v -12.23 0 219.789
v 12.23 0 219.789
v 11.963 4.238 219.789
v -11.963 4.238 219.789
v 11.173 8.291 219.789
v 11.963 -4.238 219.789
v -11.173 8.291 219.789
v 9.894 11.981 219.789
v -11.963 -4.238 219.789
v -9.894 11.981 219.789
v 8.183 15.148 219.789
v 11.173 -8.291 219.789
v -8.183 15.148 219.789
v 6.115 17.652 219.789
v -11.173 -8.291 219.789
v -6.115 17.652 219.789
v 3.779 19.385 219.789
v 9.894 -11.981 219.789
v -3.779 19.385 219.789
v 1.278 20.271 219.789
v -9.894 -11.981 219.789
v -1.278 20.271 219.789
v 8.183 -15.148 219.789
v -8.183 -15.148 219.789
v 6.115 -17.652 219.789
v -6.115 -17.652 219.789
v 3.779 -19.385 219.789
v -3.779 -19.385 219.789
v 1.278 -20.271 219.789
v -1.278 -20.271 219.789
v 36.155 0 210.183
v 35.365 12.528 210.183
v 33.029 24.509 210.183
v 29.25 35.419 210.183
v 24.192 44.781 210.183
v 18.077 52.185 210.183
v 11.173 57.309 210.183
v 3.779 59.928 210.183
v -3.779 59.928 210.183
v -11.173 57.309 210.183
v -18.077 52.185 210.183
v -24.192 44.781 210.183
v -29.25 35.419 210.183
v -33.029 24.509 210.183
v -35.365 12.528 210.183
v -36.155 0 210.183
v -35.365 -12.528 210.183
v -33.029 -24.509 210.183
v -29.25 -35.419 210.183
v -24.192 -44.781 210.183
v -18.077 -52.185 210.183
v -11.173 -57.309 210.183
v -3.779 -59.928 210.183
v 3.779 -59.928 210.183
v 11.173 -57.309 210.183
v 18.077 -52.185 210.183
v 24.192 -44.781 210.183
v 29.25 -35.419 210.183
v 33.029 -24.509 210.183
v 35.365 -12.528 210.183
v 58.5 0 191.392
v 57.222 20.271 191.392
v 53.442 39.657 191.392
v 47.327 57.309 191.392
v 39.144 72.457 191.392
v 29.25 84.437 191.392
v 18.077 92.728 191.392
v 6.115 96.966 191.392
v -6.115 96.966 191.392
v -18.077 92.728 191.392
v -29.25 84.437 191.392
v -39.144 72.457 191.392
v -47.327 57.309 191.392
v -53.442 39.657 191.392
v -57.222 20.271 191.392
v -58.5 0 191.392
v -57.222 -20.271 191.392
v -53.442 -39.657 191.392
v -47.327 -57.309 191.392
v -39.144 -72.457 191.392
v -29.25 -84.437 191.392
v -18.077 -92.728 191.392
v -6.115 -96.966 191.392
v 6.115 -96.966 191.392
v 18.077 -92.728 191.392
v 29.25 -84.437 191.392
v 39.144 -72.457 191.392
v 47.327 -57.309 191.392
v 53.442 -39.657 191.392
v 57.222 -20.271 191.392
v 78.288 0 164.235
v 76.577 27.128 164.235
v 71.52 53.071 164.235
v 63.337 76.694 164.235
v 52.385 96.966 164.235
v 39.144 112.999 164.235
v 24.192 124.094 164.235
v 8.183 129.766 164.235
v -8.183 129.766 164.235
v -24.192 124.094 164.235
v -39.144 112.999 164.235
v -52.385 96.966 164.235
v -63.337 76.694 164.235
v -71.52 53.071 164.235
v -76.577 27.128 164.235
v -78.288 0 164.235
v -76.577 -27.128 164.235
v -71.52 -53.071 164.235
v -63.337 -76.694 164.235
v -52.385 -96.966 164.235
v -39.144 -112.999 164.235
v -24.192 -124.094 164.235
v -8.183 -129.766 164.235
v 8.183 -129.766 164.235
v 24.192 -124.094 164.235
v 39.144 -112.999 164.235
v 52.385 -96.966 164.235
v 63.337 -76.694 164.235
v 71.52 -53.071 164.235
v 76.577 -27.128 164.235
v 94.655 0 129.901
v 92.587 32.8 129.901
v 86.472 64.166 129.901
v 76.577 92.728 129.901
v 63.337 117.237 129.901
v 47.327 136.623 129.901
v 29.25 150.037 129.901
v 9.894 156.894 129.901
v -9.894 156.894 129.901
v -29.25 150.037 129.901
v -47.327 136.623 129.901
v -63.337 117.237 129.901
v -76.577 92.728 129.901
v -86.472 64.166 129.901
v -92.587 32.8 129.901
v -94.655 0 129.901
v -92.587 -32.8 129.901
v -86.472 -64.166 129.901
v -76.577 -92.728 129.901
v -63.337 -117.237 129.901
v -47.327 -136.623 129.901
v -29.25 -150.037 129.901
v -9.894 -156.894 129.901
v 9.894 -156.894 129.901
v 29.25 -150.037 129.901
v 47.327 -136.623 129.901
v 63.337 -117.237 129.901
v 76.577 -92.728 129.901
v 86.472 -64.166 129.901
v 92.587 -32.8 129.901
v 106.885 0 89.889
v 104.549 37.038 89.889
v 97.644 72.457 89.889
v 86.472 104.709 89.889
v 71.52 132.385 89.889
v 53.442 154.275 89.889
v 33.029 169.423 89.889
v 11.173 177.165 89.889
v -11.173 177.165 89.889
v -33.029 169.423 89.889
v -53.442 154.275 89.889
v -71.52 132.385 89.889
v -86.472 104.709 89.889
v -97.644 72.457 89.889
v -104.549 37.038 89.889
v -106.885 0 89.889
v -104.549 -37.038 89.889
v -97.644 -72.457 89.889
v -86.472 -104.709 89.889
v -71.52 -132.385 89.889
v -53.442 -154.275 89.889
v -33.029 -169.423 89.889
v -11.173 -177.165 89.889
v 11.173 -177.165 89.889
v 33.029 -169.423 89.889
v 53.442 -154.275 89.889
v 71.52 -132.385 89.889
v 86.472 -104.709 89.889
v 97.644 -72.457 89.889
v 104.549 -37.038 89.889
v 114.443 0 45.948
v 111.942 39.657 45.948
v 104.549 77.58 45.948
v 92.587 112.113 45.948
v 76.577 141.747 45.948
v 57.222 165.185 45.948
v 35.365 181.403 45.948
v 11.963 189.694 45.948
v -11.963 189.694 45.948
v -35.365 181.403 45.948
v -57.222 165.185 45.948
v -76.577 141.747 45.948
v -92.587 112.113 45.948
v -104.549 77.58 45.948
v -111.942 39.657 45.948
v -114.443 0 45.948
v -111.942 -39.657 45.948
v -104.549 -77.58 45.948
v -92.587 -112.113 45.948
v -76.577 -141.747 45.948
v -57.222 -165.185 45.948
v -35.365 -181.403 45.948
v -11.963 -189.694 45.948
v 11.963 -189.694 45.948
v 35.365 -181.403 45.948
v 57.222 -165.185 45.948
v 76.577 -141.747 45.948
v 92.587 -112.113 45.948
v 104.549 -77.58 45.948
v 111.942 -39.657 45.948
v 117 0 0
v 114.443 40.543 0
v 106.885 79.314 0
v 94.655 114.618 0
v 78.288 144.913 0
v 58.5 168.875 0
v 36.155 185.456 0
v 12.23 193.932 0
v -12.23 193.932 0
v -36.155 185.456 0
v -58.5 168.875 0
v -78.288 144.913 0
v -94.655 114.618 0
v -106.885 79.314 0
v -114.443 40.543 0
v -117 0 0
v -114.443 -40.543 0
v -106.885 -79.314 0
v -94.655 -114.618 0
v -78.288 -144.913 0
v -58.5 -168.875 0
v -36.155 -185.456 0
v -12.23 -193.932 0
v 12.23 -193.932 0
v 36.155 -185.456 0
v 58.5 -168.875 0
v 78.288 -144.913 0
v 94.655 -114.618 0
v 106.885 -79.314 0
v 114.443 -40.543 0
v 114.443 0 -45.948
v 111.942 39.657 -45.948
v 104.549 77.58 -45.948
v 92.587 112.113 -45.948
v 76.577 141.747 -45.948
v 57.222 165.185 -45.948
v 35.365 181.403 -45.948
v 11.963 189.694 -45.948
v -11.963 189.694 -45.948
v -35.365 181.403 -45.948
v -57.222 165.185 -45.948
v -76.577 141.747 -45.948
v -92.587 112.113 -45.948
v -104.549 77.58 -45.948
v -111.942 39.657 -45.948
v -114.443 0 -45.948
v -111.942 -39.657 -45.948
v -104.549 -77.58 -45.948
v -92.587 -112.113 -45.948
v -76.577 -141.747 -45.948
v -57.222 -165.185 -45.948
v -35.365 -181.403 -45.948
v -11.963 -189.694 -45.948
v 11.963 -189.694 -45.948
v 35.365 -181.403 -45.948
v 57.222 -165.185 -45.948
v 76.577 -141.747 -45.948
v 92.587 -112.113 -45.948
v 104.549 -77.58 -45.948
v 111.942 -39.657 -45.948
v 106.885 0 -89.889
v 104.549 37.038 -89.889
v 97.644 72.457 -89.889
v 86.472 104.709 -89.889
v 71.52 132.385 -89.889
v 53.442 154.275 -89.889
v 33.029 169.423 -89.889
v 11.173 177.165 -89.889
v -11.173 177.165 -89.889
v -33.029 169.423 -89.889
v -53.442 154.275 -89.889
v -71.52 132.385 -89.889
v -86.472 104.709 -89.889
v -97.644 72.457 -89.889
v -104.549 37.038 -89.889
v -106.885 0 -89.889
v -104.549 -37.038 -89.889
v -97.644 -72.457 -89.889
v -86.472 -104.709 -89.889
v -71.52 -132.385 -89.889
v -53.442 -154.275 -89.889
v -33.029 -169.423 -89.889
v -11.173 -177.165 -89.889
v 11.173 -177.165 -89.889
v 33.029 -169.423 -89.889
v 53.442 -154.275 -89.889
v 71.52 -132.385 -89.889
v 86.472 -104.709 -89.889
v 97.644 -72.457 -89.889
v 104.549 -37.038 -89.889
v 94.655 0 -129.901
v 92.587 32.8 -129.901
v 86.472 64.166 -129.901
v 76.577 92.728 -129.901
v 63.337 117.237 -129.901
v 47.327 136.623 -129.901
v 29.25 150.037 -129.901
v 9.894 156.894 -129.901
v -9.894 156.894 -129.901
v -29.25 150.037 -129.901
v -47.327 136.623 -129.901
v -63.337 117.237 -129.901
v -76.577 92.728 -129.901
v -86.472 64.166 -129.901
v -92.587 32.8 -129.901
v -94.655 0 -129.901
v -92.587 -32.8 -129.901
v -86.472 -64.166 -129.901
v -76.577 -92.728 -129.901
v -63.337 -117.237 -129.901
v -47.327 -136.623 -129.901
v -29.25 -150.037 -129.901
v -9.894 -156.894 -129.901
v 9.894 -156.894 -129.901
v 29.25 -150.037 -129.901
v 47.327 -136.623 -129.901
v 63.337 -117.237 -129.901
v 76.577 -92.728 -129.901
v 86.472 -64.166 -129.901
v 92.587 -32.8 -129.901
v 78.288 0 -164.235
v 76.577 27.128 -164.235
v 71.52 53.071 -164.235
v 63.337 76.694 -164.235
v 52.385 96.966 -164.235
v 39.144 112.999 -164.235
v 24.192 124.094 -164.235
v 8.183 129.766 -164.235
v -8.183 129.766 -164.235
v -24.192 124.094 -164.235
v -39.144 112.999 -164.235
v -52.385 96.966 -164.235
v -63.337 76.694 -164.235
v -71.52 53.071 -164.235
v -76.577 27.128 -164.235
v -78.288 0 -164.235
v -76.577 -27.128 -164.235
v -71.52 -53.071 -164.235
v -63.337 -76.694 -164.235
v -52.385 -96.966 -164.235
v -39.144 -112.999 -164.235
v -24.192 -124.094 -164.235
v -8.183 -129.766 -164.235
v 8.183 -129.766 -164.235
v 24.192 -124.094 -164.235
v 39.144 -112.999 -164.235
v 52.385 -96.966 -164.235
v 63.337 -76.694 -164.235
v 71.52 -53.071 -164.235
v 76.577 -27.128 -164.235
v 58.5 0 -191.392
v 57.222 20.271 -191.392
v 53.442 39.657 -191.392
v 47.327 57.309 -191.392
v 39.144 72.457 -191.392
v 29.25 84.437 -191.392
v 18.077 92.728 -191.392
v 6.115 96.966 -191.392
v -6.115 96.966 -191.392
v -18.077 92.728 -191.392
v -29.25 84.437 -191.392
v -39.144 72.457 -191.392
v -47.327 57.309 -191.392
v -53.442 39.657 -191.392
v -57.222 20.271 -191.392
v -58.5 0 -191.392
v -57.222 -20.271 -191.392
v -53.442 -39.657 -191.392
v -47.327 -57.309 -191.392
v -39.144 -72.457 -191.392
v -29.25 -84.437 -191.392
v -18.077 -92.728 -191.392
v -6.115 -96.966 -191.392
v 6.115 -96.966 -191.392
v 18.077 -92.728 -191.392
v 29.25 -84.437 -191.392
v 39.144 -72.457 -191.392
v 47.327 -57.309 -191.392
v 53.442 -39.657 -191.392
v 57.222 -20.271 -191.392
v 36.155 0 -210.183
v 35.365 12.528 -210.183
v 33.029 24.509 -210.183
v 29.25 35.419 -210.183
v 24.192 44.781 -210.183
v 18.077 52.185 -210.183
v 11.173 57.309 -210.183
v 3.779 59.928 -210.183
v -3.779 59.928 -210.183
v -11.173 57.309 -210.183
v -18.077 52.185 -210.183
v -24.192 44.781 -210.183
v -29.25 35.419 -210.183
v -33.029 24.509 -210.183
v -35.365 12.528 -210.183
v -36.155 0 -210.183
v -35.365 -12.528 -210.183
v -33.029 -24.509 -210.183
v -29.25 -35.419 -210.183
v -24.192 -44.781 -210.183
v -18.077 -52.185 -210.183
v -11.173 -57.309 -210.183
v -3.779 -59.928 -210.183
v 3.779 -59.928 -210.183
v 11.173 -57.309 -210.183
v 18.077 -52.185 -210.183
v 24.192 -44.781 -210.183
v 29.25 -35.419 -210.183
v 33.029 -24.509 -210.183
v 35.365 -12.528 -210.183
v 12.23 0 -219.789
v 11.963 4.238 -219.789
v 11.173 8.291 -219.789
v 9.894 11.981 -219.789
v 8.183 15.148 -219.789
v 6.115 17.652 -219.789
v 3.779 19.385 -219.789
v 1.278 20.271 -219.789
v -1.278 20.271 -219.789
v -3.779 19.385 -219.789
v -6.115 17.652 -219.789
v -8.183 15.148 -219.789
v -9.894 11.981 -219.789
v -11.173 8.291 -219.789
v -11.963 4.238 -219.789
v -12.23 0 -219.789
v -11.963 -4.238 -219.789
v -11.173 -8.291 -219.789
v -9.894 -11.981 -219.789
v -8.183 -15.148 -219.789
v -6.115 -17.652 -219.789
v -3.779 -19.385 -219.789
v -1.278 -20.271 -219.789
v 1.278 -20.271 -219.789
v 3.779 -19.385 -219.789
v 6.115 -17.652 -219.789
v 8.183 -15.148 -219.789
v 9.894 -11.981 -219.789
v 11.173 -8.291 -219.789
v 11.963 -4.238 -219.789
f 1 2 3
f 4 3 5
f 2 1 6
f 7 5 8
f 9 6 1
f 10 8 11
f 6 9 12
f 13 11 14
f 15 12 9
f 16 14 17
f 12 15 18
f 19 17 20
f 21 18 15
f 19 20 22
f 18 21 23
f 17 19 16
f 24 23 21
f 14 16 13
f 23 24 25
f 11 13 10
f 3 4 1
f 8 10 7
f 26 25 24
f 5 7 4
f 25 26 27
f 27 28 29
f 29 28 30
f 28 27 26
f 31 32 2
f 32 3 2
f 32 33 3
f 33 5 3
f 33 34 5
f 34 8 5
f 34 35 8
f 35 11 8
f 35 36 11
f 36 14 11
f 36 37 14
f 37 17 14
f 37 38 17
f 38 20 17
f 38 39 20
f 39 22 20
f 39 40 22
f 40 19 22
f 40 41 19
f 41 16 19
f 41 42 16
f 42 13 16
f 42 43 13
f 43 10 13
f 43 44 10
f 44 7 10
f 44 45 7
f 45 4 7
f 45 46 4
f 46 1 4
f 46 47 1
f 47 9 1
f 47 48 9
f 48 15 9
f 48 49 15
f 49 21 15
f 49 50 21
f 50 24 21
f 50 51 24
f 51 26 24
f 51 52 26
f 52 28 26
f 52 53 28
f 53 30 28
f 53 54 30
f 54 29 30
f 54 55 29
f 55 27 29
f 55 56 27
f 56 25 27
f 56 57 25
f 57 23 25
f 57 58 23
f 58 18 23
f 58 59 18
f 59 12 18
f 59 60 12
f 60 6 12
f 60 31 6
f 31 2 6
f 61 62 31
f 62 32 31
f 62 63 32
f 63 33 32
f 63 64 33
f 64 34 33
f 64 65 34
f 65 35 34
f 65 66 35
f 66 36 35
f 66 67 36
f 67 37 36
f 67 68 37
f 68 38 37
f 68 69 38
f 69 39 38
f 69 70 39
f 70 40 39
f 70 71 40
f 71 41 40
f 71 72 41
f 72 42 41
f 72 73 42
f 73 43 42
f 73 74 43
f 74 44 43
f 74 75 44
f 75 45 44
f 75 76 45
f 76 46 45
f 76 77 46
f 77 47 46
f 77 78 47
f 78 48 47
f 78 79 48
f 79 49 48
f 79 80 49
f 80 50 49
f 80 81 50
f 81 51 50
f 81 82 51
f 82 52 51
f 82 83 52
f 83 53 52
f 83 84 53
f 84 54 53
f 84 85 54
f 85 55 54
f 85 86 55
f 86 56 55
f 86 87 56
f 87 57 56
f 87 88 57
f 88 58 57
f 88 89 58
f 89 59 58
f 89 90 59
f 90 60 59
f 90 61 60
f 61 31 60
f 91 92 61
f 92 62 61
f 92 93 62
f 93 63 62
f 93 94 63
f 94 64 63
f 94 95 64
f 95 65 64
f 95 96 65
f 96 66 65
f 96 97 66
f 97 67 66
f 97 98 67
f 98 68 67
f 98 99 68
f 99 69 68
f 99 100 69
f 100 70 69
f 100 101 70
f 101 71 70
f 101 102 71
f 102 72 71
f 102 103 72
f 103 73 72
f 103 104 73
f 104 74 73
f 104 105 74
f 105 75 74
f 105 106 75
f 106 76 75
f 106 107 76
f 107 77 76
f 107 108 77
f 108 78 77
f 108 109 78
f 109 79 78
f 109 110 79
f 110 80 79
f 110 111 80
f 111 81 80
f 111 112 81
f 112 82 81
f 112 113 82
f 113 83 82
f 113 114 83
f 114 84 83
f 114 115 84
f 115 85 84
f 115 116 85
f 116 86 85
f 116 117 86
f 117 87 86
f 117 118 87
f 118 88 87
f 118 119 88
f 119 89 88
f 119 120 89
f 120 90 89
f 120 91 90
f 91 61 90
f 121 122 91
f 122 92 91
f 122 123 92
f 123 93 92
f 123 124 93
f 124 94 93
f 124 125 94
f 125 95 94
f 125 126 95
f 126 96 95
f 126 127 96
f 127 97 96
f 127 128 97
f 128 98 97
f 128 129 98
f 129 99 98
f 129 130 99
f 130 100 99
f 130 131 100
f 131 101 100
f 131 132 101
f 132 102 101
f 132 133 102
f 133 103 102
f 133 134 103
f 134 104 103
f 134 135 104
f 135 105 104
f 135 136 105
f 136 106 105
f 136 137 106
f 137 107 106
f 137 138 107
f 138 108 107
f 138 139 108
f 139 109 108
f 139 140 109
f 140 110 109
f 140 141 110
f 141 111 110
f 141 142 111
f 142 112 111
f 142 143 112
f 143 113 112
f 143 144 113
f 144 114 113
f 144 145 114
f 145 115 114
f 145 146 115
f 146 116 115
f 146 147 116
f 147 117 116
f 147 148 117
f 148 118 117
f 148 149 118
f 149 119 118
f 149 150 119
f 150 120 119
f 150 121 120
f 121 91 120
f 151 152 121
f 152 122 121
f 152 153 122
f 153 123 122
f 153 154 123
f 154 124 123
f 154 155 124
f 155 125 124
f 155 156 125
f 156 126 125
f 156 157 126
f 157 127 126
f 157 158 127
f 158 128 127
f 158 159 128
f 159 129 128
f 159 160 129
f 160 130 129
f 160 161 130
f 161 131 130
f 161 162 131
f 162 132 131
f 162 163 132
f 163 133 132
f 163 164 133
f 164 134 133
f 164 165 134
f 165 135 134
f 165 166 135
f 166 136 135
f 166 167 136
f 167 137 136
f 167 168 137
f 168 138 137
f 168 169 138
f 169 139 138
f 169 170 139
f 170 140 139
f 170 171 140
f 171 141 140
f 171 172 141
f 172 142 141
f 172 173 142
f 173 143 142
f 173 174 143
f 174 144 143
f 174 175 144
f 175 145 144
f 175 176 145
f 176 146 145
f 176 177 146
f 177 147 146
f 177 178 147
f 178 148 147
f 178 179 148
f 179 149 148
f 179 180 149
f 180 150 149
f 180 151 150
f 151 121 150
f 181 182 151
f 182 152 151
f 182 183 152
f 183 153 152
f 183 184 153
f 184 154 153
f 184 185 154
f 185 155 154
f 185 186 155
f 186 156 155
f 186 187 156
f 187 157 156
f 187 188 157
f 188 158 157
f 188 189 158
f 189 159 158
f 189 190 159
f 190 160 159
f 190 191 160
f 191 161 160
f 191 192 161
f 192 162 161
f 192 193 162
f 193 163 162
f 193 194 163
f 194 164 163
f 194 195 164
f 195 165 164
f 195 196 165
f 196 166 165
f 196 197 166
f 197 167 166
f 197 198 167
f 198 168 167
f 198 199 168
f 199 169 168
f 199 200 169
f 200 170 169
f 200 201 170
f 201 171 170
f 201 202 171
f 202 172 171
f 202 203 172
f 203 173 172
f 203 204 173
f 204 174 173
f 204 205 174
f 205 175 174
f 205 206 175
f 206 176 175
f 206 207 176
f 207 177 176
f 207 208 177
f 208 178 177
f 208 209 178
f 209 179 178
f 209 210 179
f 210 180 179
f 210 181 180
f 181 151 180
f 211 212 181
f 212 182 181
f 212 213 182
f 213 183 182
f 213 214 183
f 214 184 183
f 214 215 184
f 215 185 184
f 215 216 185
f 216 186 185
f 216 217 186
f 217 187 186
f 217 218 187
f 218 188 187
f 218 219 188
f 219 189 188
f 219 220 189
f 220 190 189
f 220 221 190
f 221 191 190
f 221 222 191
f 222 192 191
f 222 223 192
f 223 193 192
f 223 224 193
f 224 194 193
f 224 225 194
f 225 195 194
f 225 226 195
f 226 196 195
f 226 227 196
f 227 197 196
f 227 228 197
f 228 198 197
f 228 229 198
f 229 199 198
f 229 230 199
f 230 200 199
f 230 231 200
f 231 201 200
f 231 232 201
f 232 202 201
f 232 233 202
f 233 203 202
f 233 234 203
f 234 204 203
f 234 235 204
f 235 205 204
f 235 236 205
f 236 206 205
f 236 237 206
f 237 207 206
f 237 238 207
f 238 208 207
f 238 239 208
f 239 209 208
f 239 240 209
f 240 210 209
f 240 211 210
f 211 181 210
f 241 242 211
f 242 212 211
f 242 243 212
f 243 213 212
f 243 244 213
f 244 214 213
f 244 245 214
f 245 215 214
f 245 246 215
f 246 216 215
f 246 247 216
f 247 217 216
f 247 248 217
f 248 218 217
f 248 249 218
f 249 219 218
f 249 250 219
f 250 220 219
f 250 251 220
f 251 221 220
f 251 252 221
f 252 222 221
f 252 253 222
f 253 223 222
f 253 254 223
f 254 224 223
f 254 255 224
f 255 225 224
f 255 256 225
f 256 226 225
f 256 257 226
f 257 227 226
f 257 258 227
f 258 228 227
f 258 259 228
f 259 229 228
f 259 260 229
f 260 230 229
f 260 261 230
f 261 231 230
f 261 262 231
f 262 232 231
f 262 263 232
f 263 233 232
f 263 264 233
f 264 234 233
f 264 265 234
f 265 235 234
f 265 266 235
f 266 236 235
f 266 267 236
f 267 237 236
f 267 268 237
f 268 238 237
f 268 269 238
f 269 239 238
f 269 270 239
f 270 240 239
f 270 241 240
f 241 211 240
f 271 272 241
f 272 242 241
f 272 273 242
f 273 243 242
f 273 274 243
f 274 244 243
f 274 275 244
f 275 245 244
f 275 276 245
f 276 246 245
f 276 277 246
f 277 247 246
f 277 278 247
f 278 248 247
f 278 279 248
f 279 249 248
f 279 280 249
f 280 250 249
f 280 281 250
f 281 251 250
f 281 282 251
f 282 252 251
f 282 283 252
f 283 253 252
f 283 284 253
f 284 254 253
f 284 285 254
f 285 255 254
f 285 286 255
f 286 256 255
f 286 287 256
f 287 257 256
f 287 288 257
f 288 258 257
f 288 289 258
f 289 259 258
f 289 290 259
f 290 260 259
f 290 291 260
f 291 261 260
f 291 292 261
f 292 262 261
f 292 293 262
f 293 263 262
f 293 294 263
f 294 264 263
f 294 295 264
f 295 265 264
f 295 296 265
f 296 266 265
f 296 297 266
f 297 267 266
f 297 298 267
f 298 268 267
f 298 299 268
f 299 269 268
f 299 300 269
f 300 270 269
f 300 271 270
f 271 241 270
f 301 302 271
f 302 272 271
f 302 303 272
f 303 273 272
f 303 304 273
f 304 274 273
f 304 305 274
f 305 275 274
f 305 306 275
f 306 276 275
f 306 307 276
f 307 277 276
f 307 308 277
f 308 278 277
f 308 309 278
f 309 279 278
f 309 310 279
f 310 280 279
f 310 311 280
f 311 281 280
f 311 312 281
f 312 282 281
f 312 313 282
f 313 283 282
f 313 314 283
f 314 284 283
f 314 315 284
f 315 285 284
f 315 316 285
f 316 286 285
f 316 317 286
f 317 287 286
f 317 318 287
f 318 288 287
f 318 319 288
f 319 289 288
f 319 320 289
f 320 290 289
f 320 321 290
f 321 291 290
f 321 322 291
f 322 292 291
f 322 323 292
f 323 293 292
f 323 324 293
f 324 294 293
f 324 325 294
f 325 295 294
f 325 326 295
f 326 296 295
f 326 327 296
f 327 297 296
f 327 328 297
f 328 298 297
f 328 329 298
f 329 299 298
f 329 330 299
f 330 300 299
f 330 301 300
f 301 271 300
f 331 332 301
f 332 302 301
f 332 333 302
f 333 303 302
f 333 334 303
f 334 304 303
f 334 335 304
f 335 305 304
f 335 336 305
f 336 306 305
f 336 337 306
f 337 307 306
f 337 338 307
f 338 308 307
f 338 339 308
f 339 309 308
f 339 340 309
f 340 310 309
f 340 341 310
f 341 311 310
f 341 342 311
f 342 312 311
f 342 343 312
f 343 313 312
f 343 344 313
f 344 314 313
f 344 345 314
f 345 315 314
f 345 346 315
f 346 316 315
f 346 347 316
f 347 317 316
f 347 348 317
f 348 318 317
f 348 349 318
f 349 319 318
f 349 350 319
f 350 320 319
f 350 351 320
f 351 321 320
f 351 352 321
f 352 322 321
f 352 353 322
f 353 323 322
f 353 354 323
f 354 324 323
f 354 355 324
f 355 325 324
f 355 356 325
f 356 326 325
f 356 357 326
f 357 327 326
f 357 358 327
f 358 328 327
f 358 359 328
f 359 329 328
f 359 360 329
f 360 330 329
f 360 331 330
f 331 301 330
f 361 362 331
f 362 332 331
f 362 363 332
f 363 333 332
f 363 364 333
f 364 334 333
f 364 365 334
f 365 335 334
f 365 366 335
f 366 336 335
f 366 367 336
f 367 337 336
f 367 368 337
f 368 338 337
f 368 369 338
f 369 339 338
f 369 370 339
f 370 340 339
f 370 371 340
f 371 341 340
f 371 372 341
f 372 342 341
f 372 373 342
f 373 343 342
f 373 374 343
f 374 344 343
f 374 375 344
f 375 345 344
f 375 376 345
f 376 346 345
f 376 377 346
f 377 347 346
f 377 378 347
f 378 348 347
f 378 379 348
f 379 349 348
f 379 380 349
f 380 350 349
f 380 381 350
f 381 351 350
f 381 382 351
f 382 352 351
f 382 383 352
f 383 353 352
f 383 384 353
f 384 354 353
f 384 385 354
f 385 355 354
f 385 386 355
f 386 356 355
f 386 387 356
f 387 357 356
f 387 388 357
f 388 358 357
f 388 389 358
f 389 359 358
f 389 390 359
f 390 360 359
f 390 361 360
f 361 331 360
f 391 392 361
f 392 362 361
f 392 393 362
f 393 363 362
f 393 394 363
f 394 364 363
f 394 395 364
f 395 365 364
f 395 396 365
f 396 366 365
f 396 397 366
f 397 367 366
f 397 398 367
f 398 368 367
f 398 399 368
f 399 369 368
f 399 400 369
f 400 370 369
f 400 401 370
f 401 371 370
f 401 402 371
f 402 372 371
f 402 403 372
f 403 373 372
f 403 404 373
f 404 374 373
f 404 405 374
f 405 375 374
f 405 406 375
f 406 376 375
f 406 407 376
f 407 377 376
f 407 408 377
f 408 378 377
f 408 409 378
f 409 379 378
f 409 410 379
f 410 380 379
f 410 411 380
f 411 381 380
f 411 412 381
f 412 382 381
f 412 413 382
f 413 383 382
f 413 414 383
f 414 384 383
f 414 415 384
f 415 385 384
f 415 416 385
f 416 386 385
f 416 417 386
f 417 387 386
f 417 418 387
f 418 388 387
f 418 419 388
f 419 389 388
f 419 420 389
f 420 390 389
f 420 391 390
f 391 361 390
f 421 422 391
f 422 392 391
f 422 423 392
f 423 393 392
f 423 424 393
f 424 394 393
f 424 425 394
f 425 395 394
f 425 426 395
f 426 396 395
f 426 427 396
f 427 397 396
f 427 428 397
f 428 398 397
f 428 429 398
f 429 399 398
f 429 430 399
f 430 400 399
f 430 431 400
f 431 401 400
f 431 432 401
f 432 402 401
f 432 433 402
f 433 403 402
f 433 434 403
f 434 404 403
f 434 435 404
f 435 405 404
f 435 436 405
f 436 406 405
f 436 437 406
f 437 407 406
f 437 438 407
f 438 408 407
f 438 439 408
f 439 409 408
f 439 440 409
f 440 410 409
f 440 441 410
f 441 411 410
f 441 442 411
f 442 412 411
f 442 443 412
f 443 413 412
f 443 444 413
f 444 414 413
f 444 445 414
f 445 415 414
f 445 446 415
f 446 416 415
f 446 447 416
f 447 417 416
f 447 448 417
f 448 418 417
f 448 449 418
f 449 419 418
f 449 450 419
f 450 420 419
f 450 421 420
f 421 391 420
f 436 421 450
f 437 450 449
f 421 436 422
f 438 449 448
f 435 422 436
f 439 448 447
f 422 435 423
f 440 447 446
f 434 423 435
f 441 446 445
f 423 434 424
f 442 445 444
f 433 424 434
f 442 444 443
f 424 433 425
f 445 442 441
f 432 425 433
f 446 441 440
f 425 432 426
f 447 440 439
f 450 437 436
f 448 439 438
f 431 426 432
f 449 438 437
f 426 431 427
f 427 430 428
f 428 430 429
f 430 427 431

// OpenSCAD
// Generated by SolidPython 1.0.1 on 2020-07-29 00:46:49


scale(v = [9, 15, 17]) {
	sphere(r = 13);
}
/***********************************************
*********      SolidPython code:      **********
************************************************
 
# import packages: SolidPython
from solid import *
from solid.utils import *
from itertools import chain, combinations, permutations


class Resize:

    def __init__(self, scad_file):
        self.scad_file = scad_file
        #self.scad_file = import_scad(scad_file)
        # cone/cylinder param:
        self.r1 = 0
        self.r2 = 0
        self.h = 0
        # rectangular prism param:
        self.w = 0
        self.l = 0
        # ellipse param:
        self.r = 0

    # import OpenScad code (file name corresponds to shape)


    # classify shape + parameters
    def assign(self, param1, param2, param3):
        if self.scad_file == 'cone.scad':
            self.r1 = param1
            self.r2 = param2
            self.h = param3
        elif self.scad_file == 'cylinder.scad':
            self.r1 = param1
            self.r2 = param2
            self.h = param3
        elif self.scad_file == 'rectangularPrism.scad':
            self.h = param1
            self.l = param2
            self.w = param3
        else:
            self.r = param1
            self.h = param2

    # resize parameters
    def iterate(self):
        x = range(3, 20, 2)
        i = 1
        if self.scad_file == 'cone.scad':
            tempList = list(permutations(x, 2))
            for temp in tempList:
                param1 = temp[0]
                param2 = temp[1]
                filepath = 'produced_scad_files/' + 'cone' + str(param1) + '_' + str(param2) + '_' + '.scad'
                scad_render_to_file(cylinder(h=param1, r1=param2, r2=0), filepath)

        elif self.scad_file == 'cylinder.scad':
            tempList = list(permutations(x, 3))
            for temp in tempList:
                param1 = temp[0]
                param2 = temp[1]
                filepath = 'produced_scad_files/' + 'cylinder' + str(param1) + '_' + str(param2) + '_' + '.scad'
                scad_render_to_file(cylinder(h=param1, r1=param2, r2=param2), filepath)

        elif self.scad_file == 'rectangularPrism.scad':
            tempList = list(permutations(x, 3))
            for temp in tempList:
                param1 = temp[0]
                param2 = temp[1]
                param3 = temp[2]
                filepath = 'produced_scad_files/' + 'rectangularPrism' + str(param1) + '_' + str(param2) + '_' + str(
                    param3) + '.scad'
                scad_render_to_file(cube(size=(param1, param2, param3)), filepath)

        elif self.scad_file == 'ellipse.scad':
            tempList = list(permutations(x, 4))
            for temp in tempList:
                param1 = temp[0]
                param2 = temp[1]
                param3 = temp[2]
                param4 = temp[3]
                filepath = 'produced_scad_files/' + 'ellipse' + str(param1) + '_' + str(param2) + '_' + str(param3) + '_' + str(param4) + '.scad'
                scad_render_to_file(scale([param1, param2, param3])(sphere(r=param4)), filepath)

    def render_to_scadfile(self):
        scad_render_to_file(scad, 'example.scad') 
 
************************************************/
